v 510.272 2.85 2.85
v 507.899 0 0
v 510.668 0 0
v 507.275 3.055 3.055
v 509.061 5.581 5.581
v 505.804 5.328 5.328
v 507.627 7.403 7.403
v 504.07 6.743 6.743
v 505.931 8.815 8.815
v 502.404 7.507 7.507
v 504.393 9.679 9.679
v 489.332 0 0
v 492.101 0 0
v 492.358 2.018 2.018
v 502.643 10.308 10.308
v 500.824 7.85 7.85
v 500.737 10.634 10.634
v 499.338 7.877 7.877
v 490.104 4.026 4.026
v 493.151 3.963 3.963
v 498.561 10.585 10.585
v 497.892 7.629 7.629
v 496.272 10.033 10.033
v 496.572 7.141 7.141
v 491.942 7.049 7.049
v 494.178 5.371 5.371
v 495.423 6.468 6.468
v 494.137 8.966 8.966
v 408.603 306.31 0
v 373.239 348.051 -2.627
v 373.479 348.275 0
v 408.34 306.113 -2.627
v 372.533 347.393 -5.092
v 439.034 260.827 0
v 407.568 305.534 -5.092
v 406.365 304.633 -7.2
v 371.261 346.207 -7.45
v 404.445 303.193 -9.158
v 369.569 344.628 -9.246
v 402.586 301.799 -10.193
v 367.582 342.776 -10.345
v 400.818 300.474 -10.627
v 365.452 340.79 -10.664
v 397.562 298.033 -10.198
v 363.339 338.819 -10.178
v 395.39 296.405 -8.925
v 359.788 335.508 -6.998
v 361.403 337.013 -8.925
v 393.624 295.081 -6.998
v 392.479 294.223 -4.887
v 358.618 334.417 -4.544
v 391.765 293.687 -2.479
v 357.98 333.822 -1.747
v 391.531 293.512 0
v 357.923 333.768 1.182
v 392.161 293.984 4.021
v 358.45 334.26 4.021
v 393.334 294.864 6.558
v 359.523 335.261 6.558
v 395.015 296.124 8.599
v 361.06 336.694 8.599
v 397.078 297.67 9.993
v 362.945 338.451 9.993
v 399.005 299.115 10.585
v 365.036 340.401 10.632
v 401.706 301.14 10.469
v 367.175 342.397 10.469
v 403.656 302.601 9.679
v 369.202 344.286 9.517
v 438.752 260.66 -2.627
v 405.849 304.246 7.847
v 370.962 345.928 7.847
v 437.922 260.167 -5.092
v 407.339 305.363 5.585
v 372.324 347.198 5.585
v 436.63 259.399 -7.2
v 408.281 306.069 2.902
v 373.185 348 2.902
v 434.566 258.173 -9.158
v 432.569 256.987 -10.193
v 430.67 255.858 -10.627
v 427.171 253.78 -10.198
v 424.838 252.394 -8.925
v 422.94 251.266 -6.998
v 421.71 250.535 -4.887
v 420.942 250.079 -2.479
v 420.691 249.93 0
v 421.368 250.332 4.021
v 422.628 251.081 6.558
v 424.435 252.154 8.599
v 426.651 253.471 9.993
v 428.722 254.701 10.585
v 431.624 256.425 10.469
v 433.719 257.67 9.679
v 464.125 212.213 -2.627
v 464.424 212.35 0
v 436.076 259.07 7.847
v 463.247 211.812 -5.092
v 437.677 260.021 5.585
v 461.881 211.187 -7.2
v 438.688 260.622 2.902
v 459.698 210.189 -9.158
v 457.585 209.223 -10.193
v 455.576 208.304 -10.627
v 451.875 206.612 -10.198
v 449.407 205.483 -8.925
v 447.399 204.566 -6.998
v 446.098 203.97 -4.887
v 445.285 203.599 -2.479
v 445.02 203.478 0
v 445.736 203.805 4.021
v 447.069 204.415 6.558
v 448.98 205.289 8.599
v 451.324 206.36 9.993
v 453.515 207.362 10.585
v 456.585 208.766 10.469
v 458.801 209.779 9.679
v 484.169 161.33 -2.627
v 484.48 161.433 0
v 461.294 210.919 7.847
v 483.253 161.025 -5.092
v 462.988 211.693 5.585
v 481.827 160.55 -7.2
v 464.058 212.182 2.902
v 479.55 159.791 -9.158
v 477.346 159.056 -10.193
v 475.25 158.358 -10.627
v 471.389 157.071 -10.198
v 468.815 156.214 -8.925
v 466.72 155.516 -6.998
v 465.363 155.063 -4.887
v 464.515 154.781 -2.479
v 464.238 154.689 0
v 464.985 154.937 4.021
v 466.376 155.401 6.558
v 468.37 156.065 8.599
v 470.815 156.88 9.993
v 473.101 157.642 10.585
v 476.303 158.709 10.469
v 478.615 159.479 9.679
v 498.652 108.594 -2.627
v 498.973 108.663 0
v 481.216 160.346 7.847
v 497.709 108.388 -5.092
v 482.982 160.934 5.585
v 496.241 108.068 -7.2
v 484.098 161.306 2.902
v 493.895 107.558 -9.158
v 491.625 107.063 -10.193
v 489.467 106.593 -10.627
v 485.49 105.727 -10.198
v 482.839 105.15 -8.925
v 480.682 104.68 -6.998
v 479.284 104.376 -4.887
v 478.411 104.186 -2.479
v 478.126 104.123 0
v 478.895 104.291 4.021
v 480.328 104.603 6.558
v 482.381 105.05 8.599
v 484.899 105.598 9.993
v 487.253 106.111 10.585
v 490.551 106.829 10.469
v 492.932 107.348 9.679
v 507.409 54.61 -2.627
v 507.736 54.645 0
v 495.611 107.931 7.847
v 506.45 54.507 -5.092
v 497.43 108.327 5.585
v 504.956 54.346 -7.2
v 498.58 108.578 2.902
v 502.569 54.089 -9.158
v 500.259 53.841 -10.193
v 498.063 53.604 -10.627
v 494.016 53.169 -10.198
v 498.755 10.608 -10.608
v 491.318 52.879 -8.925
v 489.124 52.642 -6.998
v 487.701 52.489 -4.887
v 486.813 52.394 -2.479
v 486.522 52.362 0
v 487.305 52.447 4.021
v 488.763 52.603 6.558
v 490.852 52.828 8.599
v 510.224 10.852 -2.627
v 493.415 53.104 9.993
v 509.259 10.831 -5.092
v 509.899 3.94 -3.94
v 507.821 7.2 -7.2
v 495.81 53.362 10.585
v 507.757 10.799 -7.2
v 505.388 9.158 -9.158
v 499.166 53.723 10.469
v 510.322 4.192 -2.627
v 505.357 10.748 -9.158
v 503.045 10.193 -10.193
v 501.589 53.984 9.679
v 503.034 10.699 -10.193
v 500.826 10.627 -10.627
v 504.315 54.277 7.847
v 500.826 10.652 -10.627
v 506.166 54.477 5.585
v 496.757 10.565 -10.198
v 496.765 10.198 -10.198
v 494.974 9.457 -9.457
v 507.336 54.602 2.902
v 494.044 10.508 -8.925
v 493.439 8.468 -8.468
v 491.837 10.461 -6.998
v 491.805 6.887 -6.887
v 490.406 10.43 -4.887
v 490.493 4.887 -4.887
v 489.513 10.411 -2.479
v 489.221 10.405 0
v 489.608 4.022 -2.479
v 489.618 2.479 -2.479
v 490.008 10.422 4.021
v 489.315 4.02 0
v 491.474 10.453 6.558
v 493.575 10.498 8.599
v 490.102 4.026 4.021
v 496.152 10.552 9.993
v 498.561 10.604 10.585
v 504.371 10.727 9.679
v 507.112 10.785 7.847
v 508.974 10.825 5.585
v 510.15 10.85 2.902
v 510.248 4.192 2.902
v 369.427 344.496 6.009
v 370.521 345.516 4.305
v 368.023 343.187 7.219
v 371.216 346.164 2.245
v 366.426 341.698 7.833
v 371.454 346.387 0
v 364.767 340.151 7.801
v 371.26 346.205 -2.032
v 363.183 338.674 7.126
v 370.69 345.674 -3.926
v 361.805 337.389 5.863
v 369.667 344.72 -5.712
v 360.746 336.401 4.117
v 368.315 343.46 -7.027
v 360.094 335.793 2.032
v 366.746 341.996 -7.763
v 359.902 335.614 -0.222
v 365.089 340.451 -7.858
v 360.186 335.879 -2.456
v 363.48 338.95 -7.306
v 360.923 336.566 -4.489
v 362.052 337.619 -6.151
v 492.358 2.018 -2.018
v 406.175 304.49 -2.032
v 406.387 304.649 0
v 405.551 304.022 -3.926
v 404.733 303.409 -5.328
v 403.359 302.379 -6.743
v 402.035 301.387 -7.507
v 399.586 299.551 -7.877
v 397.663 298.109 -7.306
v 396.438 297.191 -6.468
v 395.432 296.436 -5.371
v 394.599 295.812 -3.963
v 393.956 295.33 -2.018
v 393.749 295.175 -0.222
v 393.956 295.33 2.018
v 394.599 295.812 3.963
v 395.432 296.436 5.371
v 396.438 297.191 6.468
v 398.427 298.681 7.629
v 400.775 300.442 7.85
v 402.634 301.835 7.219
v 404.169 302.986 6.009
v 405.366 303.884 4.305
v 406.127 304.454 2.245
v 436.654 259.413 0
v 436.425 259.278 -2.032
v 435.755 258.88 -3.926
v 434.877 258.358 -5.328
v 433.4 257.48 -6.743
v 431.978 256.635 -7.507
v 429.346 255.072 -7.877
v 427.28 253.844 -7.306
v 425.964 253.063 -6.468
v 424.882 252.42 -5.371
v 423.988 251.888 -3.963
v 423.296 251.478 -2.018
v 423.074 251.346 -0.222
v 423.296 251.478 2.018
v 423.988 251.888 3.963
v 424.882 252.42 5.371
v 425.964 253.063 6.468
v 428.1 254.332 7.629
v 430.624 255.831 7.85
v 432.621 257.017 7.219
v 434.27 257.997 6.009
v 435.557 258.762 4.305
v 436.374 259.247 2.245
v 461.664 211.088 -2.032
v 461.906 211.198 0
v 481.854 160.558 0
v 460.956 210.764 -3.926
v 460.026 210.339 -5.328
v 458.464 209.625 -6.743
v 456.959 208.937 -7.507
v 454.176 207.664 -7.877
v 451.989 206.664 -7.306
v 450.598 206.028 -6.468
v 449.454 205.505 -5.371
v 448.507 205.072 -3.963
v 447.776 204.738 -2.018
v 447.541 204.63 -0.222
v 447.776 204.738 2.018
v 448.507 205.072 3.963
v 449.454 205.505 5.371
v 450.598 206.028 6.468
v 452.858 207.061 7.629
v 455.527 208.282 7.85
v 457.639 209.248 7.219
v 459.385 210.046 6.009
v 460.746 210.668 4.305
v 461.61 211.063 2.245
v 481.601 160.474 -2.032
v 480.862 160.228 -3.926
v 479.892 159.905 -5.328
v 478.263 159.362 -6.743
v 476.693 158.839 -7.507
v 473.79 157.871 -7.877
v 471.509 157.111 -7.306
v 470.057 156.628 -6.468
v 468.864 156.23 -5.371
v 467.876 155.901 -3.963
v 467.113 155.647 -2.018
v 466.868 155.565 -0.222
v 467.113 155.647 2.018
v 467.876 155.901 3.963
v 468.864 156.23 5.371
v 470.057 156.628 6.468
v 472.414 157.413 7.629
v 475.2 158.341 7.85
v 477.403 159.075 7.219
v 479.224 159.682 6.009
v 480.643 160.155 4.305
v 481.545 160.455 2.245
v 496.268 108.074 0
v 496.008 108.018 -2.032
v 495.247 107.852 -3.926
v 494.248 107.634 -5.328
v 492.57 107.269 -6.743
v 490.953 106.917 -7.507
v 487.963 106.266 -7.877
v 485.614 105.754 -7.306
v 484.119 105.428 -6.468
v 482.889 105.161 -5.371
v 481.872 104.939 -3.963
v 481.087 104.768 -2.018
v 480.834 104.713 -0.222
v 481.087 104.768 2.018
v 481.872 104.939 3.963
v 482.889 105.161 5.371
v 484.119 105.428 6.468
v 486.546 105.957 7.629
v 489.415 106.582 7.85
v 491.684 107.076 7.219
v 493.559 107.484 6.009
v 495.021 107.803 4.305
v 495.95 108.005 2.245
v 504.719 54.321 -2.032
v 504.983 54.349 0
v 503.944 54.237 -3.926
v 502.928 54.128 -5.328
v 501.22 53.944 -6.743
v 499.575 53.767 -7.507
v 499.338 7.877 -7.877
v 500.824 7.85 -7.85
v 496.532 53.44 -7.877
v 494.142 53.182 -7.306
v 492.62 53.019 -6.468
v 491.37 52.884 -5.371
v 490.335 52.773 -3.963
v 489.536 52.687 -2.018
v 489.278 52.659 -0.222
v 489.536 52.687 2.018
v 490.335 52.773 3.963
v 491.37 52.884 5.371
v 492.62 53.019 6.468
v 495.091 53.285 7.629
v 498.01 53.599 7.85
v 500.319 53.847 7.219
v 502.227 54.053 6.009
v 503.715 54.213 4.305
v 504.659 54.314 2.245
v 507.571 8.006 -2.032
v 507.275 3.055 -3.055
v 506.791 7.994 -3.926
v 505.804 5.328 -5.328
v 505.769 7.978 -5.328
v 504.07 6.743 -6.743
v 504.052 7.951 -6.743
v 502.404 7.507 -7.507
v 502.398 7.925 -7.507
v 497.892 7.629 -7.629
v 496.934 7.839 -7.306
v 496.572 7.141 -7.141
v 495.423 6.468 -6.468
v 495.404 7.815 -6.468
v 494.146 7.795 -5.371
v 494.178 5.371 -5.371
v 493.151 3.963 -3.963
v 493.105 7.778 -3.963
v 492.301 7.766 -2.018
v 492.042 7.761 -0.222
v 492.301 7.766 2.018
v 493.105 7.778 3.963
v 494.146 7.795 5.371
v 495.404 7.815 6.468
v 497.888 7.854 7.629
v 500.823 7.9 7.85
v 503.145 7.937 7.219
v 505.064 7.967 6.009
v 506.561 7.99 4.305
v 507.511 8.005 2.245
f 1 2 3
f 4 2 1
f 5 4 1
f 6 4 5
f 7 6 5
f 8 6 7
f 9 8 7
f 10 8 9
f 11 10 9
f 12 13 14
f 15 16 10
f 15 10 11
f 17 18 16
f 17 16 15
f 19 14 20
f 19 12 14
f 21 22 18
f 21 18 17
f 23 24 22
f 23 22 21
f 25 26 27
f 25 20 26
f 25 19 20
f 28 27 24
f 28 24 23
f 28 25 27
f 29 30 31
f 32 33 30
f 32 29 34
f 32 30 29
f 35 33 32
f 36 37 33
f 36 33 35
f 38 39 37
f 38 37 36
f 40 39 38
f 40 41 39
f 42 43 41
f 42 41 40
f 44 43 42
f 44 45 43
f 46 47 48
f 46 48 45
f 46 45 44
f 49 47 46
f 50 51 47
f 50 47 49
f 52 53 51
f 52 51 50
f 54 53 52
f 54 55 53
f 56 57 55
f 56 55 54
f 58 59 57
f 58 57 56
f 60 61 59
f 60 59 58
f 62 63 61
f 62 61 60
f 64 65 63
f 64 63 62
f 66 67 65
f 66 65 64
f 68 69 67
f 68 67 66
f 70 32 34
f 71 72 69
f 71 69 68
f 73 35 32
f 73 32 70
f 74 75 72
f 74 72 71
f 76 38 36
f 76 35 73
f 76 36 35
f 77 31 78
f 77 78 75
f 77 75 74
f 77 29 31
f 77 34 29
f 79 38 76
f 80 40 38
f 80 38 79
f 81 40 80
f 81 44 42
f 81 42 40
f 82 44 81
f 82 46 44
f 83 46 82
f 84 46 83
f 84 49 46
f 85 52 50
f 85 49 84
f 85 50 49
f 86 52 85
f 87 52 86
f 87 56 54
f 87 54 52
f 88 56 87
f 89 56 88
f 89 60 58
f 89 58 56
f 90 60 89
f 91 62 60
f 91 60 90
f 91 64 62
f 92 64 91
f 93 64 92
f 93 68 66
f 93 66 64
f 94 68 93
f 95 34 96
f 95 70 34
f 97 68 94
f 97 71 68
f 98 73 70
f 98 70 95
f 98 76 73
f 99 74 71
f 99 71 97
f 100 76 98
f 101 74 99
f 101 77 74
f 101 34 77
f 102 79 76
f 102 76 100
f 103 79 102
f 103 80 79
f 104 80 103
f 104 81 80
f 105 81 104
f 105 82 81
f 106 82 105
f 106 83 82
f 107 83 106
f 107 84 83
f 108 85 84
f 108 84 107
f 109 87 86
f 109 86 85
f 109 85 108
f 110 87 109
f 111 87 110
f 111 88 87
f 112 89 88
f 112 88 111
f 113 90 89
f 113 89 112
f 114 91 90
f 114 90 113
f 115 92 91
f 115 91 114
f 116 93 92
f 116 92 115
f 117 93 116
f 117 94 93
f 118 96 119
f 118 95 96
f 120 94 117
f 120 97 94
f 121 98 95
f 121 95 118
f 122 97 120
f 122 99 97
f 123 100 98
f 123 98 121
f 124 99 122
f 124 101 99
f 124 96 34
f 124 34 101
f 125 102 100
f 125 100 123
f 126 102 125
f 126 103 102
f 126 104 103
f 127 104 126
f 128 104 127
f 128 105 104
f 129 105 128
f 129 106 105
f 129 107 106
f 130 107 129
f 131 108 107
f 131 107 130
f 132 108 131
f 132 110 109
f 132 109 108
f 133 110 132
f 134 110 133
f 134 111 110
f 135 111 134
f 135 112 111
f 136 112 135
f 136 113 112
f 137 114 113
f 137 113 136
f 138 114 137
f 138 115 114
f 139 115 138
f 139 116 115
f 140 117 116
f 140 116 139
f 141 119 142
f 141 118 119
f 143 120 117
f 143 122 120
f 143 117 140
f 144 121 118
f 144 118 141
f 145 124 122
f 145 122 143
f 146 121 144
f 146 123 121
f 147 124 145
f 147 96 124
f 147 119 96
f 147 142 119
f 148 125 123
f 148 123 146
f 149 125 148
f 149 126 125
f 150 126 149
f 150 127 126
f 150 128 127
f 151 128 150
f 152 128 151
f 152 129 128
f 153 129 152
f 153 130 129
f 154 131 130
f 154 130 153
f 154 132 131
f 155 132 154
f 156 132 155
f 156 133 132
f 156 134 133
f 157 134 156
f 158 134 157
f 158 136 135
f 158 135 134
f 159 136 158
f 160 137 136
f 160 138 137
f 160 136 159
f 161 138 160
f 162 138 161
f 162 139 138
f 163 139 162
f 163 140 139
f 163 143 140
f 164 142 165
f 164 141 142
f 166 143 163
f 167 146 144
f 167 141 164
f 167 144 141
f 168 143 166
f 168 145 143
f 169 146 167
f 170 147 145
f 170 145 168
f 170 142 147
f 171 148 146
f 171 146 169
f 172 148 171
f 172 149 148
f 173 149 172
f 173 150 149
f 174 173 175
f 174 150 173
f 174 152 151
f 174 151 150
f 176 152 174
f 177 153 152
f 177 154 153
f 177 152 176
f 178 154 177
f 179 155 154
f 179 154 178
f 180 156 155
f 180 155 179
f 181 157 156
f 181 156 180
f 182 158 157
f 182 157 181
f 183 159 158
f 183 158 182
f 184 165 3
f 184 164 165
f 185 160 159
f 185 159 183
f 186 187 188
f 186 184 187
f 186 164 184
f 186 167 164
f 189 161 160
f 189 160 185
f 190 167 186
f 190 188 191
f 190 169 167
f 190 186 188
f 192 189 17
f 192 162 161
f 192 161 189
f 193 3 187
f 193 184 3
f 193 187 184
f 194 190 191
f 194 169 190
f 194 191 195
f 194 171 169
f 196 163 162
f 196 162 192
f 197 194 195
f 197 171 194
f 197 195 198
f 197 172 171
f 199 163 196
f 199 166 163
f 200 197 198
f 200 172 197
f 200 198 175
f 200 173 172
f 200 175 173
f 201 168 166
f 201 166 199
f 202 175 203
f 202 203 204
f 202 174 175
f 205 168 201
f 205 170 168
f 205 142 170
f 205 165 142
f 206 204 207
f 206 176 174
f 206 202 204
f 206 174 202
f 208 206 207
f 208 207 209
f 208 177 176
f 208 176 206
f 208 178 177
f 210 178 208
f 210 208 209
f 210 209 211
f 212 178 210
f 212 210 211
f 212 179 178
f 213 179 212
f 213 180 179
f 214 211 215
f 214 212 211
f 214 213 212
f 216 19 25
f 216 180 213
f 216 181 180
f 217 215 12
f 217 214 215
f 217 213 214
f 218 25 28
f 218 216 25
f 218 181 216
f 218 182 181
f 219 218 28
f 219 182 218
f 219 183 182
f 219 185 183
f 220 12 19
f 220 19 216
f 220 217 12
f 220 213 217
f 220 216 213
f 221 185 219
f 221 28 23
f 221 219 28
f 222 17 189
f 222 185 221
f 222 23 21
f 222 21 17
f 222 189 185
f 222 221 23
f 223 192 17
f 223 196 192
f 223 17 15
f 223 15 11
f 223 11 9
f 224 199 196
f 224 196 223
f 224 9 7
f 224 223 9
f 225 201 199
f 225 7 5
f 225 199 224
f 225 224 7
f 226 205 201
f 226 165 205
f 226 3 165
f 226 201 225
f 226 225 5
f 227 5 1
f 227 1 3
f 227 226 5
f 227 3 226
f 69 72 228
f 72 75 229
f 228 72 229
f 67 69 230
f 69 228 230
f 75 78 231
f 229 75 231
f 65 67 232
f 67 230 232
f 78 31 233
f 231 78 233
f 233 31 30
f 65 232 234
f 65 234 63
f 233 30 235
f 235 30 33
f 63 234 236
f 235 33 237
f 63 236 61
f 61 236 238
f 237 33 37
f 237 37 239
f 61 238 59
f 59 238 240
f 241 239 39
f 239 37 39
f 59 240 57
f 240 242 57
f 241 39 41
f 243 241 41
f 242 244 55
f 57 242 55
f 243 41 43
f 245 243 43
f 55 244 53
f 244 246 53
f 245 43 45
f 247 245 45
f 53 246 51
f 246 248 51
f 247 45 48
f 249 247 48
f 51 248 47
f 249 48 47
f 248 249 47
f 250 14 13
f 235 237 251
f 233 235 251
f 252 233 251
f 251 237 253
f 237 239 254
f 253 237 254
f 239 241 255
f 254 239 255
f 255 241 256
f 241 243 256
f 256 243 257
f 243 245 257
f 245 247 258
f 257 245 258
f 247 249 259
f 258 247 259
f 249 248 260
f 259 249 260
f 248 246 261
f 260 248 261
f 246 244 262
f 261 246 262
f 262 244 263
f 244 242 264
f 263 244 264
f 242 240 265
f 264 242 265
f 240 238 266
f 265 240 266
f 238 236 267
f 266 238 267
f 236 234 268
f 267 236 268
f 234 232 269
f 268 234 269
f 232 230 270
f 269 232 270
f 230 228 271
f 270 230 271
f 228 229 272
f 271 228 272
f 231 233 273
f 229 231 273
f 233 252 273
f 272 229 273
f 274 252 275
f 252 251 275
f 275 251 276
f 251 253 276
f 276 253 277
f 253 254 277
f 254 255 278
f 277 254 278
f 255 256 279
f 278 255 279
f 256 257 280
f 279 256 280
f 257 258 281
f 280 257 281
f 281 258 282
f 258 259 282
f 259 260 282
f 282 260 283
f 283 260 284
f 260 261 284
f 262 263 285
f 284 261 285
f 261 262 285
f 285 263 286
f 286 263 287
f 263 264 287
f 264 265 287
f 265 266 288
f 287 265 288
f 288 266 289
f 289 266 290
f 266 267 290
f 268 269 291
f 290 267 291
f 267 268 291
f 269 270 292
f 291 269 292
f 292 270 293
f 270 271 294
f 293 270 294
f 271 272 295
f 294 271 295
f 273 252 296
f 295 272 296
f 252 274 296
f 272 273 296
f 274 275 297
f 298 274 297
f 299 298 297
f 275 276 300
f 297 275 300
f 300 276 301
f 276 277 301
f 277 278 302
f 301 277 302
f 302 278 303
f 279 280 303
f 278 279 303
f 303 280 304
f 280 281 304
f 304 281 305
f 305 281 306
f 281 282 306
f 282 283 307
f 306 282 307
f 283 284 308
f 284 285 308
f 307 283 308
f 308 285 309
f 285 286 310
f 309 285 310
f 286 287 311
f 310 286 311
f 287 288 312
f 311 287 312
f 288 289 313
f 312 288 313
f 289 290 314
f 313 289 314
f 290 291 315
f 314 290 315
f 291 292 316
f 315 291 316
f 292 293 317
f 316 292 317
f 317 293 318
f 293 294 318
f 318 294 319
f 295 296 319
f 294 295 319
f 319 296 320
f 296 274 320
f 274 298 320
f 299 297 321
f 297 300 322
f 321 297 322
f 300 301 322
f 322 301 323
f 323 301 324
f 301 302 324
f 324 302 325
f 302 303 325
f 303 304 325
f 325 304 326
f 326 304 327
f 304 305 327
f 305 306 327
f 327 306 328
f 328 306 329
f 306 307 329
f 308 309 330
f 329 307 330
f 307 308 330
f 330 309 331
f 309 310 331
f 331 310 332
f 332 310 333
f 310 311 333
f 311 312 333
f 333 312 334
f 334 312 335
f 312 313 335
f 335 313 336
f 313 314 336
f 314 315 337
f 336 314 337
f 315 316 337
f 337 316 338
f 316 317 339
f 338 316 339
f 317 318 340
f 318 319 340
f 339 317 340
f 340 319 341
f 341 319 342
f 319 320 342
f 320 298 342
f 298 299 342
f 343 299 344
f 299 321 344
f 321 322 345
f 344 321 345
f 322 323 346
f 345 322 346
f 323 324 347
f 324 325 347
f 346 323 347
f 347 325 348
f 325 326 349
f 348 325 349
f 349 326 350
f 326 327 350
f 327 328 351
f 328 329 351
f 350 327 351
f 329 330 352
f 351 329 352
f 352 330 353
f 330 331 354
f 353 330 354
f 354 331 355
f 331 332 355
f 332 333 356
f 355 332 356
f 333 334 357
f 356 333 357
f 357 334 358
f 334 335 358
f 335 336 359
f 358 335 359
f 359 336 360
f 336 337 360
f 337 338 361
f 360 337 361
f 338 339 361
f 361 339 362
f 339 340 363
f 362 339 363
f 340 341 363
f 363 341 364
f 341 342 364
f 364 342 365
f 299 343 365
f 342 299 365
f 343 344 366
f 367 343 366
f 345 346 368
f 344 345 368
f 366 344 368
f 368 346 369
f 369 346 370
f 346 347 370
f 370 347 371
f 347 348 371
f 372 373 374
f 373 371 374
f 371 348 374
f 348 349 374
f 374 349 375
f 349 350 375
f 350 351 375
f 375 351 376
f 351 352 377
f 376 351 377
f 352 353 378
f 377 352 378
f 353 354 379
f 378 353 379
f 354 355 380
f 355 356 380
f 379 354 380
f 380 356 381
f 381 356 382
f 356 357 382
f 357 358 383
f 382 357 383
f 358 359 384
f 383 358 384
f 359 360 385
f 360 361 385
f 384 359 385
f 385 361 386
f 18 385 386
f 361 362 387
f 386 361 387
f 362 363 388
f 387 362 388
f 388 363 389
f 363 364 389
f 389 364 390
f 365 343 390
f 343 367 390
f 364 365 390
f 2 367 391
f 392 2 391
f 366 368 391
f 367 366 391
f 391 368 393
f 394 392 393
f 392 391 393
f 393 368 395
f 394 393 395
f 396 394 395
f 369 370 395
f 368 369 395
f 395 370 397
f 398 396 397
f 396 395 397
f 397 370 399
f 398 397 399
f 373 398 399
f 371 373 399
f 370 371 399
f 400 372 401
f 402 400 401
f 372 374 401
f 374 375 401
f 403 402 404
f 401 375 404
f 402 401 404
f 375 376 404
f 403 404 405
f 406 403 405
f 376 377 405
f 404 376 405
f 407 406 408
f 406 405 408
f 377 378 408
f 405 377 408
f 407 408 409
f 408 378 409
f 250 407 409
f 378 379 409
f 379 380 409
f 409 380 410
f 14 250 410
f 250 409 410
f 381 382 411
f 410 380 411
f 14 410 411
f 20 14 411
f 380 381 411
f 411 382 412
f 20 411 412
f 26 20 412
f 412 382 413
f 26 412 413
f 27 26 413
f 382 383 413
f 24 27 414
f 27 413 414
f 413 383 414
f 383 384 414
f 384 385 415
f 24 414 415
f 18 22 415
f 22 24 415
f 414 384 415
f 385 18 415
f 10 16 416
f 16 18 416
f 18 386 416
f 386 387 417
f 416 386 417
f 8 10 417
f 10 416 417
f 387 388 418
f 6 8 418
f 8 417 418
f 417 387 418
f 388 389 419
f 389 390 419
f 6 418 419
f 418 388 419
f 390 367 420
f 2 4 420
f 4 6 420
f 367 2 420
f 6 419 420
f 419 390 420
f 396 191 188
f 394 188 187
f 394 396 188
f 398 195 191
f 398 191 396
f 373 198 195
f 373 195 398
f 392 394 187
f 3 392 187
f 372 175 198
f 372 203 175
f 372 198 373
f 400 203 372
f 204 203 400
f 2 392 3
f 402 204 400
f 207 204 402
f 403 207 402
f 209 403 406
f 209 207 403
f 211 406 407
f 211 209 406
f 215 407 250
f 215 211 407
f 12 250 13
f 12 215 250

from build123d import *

# Parameters (mm, degrees)
SKETCH2_R          = 10.668
SKETCH2_R_2        = 7.8994
CUT_EXTRUDE2_DEPTH = 723.272399361
CUT_EXTRUDE4_START = 489.220558
CUT_EXTRUDE4_DEPTH = 21.447442


with BuildPart() as part:
    # Sweep1: sweep along a path in Sketch1
    with BuildLine(Plane.XY) as sweep1_path:
        ThreePointArc((0, 500), (353.553390593, 353.553390593), (500, 0))
    # Sketch2 → Sweep1 (sweep)
    with BuildSketch(Plane(origin=(0, 0, 0), x_dir=(1, 0, 0), z_dir=(0, 1, 0))):
        with Locations((500, 0)):
            Circle(SKETCH2_R)
        with Locations((500, 0)):
            Circle(SKETCH2_R_2, mode=Mode.SUBTRACT)
    sweep(path=sweep1_path.line)

    # Sketch4 → Cut-Extrude2 (cut, through all)
    with BuildSketch(Plane(origin=(0, 0, 0), x_dir=(0, 0, -1), z_dir=(1, 0, 0))):
        Polygon((0, 0), (-10.668, 10.668), (-10.668, -2.04612568), (10.668, -2.04612568), (10.668, 10.668), align=None)
    extrude(amount=CUT_EXTRUDE2_DEPTH, mode=Mode.SUBTRACT)

    # Sketch3 → Cut-Extrude4 (cut)
    with BuildSketch(Plane(origin=(0, 0, 0), x_dir=(1, 0, 0), z_dir=(0, 1, 0)).offset(CUT_EXTRUDE4_START)):
        Polygon((0, 0), (10.668, 10.668), (-11.575334071, 10.668), (-11.575334071, -10.668), (10.668, -10.668), align=None)
    extrude(amount=CUT_EXTRUDE4_DEPTH, mode=Mode.SUBTRACT)


with BuildPart() as body_2:
    # Split1: the piece on the far side of the plane
    add(part.part)
    split(bisect_by=Plane(origin=(-97.926528316, -91.317964988, -292.891733477), x_dir=(-0.7313537016191695, -0.6819983600624997, 0), z_dir=(0.6819983600624997, -0.7313537016191695, 1.2184435043554652e-15)), keep=Keep.BOTTOM)


with BuildPart() as part_1:
    add(part.part)

    # Split1
    split(bisect_by=Plane(origin=(-97.926528316, -91.317964988, -292.891733477), x_dir=(-0.7313537016191695, -0.6819983600624997, 0), z_dir=(0.6819983600624997, -0.7313537016191695, 1.2184435043554652e-15)), keep=Keep.TOP)


solid = part_1.part
